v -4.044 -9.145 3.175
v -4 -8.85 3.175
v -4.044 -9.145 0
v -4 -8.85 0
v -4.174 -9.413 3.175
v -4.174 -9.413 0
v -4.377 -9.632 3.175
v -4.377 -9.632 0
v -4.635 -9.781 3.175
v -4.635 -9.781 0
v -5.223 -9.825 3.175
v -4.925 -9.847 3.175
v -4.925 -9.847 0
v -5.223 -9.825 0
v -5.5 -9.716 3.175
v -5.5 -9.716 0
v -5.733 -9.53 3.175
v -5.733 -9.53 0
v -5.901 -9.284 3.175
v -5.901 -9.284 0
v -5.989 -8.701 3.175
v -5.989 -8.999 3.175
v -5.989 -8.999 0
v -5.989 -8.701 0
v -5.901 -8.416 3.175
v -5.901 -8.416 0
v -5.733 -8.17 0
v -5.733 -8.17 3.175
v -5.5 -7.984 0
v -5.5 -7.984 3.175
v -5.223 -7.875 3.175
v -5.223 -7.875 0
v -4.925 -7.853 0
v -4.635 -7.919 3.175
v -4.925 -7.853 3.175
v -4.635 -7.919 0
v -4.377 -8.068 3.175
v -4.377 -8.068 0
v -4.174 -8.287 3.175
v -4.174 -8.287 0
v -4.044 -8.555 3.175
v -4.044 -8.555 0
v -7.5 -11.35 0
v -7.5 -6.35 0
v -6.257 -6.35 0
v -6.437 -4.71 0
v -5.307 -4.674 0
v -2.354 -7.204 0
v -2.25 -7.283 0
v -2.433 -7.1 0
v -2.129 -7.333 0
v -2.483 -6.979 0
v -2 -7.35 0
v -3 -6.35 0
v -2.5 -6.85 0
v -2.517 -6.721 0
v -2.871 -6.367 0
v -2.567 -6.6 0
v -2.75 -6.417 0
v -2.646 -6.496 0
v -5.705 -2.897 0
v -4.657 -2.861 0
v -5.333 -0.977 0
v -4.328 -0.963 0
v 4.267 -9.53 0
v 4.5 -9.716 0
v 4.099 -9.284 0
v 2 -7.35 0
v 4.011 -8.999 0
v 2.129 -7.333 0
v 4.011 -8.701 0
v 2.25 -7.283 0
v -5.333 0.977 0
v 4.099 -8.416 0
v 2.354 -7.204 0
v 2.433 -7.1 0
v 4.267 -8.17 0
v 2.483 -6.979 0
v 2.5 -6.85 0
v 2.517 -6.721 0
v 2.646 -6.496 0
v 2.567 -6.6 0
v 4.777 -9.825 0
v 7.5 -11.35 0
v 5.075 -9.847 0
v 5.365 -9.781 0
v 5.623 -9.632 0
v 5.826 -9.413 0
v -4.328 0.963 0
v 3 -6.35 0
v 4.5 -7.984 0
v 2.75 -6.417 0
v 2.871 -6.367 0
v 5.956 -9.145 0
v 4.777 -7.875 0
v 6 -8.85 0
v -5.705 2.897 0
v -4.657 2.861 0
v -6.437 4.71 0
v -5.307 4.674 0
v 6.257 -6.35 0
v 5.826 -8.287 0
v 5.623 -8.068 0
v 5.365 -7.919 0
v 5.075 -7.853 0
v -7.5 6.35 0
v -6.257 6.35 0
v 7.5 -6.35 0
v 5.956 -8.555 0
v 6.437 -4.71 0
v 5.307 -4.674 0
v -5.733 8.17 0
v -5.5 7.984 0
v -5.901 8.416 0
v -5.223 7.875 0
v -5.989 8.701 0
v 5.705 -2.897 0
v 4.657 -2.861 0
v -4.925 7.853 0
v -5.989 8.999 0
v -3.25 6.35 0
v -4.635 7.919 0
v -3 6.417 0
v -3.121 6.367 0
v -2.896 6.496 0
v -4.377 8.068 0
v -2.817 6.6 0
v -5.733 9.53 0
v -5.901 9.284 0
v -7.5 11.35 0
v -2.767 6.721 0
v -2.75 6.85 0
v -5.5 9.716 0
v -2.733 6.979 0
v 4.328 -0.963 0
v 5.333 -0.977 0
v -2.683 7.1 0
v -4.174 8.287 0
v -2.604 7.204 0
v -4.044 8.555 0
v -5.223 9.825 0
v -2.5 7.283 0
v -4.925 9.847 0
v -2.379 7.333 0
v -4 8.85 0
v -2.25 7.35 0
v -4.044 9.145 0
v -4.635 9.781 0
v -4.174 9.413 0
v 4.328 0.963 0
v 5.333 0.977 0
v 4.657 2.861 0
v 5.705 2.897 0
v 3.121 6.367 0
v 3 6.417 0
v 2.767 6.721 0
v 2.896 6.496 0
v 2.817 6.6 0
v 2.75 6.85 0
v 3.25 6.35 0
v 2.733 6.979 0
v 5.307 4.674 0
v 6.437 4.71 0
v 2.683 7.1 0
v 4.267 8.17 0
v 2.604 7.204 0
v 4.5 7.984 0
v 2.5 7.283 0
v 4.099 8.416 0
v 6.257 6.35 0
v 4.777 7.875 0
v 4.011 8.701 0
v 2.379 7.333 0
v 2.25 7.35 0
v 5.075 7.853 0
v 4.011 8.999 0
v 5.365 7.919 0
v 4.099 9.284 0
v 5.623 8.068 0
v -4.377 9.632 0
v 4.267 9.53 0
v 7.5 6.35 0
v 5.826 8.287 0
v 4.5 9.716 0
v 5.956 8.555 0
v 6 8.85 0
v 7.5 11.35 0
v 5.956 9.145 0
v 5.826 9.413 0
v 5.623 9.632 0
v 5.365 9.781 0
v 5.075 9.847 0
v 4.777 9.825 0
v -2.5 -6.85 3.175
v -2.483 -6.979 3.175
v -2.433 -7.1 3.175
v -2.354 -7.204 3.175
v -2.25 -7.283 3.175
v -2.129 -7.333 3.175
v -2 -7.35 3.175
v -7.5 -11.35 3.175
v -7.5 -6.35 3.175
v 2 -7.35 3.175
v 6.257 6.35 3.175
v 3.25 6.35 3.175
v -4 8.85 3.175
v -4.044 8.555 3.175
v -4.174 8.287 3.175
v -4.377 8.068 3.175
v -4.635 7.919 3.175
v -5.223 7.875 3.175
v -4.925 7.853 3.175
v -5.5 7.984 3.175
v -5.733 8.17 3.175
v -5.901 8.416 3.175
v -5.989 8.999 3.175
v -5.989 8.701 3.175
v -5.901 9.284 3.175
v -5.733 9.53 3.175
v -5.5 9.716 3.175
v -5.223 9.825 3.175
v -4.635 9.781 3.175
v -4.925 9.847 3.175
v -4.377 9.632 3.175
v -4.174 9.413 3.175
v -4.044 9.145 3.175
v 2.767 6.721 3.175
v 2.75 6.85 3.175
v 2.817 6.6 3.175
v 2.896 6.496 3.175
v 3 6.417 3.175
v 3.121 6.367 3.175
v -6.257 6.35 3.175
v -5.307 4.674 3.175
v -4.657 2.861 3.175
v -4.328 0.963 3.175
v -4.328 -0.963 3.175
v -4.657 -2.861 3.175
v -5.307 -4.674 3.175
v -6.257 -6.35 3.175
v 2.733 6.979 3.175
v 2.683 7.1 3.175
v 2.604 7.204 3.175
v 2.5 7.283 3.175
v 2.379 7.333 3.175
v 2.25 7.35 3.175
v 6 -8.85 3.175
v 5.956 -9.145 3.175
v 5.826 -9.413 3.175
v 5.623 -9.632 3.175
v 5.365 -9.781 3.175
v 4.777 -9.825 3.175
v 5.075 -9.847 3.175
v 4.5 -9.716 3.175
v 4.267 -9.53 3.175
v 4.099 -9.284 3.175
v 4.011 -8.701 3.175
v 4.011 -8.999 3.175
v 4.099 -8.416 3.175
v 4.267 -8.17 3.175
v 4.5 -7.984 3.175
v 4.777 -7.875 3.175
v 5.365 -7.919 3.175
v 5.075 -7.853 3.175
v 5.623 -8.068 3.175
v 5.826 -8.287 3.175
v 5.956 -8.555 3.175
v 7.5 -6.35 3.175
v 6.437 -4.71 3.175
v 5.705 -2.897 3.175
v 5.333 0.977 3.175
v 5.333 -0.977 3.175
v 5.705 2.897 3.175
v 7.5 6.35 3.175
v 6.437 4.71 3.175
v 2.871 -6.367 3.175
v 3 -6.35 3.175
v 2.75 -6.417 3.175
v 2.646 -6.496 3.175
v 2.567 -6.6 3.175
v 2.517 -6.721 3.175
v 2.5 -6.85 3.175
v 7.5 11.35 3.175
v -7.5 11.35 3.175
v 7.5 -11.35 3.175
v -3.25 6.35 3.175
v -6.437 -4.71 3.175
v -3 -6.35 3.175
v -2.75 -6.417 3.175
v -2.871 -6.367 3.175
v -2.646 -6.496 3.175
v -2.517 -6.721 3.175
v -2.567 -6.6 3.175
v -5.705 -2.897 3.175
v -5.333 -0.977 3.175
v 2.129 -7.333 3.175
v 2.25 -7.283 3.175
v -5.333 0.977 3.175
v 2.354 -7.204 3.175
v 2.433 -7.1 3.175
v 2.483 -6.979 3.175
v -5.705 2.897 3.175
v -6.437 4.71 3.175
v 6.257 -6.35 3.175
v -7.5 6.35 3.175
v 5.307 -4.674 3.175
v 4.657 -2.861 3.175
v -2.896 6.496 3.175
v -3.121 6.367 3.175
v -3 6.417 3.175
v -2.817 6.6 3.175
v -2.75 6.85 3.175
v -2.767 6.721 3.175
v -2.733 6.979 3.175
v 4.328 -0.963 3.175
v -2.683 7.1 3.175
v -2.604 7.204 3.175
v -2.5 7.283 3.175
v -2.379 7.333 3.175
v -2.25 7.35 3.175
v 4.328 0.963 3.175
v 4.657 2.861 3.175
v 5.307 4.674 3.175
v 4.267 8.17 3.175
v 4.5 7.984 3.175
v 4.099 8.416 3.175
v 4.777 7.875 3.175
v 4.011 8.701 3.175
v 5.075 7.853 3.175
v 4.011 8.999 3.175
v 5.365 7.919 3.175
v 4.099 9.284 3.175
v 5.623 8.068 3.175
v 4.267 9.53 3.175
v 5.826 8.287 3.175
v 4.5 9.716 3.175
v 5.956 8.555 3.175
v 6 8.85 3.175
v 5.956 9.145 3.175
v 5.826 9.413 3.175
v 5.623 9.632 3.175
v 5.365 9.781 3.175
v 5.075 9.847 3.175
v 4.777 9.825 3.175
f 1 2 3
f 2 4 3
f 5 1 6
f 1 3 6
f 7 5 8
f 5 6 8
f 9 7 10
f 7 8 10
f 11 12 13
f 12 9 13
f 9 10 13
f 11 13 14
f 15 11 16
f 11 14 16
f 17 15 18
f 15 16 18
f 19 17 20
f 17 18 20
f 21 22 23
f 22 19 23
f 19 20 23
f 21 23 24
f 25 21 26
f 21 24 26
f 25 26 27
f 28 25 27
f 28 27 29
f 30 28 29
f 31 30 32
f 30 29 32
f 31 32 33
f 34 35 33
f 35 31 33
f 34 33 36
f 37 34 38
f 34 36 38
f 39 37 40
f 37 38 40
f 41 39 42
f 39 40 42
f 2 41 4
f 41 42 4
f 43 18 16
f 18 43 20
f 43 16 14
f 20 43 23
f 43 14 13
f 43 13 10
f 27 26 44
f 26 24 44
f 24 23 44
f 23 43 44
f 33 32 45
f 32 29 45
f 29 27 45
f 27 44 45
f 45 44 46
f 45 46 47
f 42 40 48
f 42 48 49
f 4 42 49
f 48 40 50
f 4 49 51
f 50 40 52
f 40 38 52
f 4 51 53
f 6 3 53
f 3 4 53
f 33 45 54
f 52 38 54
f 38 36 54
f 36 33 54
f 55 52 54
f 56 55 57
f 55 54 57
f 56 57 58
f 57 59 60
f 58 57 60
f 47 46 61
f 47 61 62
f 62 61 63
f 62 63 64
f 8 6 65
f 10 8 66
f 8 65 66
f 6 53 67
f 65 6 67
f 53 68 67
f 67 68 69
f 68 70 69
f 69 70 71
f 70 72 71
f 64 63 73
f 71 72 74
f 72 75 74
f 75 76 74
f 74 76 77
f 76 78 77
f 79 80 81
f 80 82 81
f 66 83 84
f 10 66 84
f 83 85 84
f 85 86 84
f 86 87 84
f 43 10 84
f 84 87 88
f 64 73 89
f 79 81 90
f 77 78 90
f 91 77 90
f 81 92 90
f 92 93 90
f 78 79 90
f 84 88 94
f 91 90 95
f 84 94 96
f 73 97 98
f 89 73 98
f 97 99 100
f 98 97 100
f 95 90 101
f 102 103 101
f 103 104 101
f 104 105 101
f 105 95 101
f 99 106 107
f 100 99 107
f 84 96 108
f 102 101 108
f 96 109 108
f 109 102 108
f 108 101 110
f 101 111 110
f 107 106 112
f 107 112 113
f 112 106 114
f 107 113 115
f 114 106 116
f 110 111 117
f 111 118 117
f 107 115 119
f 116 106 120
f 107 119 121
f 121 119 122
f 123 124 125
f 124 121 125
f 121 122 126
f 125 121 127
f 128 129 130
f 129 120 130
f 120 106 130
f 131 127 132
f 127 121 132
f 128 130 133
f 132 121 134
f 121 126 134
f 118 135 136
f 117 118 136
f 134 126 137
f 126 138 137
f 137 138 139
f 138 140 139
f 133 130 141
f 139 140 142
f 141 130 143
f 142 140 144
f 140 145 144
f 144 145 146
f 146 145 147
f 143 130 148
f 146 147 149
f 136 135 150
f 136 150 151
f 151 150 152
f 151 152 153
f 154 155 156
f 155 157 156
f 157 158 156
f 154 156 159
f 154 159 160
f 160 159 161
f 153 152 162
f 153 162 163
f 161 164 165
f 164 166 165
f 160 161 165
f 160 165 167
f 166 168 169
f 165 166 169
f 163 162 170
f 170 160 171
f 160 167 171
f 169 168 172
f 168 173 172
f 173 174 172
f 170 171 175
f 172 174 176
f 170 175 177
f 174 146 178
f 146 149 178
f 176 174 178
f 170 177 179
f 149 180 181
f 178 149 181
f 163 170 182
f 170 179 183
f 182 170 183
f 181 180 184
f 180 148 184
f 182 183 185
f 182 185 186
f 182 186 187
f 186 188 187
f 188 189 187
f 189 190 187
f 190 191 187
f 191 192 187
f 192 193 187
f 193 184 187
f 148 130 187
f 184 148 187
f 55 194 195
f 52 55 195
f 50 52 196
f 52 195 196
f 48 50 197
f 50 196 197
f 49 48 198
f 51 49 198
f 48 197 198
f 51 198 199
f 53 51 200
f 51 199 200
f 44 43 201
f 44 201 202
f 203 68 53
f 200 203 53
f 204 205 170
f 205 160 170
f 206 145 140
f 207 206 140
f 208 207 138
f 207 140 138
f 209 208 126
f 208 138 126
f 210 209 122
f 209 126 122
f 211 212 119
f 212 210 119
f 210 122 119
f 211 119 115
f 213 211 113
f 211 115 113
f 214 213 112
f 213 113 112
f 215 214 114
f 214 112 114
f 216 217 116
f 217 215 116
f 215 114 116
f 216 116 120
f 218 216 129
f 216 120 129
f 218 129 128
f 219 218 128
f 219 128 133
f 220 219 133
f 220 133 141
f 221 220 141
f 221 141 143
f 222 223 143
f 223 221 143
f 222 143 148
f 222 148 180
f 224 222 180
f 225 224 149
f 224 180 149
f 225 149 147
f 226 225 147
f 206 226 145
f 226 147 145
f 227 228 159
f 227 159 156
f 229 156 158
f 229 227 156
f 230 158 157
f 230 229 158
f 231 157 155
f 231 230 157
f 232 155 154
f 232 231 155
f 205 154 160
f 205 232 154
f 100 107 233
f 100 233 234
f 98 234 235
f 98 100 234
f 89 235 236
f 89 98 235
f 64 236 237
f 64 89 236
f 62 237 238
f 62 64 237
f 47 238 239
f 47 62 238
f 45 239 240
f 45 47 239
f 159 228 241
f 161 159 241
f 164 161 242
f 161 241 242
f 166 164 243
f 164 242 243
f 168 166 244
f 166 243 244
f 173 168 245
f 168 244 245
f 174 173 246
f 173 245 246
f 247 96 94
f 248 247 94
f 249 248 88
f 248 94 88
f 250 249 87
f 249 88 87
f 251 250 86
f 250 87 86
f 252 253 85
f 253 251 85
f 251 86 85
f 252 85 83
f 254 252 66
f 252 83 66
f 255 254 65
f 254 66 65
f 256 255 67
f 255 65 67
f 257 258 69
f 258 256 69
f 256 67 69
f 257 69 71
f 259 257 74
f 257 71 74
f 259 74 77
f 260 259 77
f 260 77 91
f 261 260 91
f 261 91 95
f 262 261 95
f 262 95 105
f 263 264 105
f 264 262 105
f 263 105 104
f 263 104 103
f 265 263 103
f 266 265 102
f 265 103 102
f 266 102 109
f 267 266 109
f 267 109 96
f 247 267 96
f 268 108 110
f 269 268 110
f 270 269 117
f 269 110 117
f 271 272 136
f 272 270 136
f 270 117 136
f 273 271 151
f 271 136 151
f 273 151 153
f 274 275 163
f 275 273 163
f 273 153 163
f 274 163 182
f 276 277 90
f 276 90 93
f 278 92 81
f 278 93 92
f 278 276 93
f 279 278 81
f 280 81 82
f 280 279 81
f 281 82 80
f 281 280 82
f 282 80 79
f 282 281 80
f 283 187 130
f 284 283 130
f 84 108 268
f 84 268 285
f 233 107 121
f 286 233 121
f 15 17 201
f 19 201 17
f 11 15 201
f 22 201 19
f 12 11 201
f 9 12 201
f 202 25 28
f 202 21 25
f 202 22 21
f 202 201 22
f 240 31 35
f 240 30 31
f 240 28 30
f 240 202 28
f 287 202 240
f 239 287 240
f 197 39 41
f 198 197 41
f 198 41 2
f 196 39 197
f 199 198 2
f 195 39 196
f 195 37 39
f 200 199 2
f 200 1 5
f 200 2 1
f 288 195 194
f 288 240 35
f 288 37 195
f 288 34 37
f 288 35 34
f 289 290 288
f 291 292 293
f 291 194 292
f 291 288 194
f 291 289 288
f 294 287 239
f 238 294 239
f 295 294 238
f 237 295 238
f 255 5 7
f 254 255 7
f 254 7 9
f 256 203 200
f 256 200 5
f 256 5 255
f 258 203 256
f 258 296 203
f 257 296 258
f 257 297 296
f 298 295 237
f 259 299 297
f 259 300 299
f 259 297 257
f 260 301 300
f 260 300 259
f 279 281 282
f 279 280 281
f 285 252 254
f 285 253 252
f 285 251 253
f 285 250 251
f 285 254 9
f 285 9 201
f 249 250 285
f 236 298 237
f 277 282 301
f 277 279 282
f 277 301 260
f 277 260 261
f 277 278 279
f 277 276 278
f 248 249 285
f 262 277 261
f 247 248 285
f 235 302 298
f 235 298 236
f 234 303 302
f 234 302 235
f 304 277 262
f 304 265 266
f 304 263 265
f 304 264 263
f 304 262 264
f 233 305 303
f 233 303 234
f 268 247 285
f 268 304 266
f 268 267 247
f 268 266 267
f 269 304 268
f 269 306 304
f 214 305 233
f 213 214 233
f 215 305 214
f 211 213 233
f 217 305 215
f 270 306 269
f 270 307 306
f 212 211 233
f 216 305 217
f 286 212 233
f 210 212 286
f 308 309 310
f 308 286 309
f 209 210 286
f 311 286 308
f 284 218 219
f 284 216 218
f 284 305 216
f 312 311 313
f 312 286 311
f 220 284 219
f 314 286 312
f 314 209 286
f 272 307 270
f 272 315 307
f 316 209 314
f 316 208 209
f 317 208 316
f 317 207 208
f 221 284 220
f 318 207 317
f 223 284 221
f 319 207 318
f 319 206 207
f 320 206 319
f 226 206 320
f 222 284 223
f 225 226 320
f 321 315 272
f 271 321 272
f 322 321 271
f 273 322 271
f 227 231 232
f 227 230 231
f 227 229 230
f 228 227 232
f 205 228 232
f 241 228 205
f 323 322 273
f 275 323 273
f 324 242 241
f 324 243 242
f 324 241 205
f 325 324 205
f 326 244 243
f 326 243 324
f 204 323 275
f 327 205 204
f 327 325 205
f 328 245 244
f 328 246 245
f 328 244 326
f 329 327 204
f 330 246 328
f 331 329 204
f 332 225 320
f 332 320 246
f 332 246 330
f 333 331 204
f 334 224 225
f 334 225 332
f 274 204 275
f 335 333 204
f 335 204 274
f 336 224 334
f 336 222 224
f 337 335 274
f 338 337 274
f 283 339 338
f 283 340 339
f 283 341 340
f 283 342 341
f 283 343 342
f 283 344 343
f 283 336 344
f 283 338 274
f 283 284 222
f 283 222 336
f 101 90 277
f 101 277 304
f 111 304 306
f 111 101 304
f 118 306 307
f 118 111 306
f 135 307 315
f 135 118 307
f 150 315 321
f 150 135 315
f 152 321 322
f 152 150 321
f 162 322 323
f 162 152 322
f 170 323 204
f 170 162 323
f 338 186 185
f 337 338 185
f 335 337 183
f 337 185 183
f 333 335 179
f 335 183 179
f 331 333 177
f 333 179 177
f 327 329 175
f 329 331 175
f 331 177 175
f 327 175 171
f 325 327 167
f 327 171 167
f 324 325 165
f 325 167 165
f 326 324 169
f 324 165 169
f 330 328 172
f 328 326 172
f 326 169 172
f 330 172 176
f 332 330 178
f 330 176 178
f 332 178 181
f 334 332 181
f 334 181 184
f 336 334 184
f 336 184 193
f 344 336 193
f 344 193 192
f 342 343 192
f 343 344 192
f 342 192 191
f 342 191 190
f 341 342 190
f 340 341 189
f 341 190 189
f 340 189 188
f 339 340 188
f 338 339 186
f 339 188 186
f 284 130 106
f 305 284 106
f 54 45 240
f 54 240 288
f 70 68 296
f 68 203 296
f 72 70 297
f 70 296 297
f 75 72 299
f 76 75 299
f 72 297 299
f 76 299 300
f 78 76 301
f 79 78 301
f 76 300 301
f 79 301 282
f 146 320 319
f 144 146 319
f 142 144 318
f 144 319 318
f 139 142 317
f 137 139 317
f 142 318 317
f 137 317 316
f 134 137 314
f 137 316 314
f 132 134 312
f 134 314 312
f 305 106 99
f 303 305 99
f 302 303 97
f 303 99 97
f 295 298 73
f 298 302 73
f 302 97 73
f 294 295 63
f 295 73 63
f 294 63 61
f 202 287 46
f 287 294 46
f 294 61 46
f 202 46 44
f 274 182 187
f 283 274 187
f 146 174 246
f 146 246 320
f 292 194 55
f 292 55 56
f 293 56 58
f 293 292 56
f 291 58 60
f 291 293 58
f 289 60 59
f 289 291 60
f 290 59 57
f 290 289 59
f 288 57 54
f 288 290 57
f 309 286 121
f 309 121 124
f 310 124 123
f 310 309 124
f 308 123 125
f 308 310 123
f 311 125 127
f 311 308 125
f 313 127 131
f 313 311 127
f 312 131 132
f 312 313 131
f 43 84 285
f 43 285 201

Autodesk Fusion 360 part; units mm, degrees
sketch "Sketch1" plane through (0, 0, 0) normal (0, 0, 1) x (1, 0, 0)
  line L0 (-7.5, 6.35) -> (7.5, 6.35)
  line L1 (7.5, 6.35) -> (7.5, 11.35)
  line L2 (7.5, 11.35) -> (-7.5, 11.35)
  line L3 (-7.5, 11.35) -> (-7.5, 6.35)
  line L4 (-7.5, 6.35) -> (7.5, 11.35) construction
  line L5 (7.5, 6.35) -> (-7.5, 11.35) construction
  line L6 (-7.5, -6.35) -> (7.5, -6.35)
  line L7 (7.5, -6.35) -> (7.5, -11.35)
  line L8 (7.5, -11.35) -> (-7.5, -11.35)
  line L9 (-7.5, -11.35) -> (-7.5, -6.35)
  line L10 (-7.5, -6.35) -> (7.5, -11.35) construction
  line L11 (7.5, -6.35) -> (-7.5, -11.35) construction
  arc A0 (-7.5, -6.35) -> (-7.5, 6.35) centre (-15.5, 0) ccw
  arc A1 (-6.2573, -6.35) -> (-6.2573, 6.35) centre (-15.5, 0) ccw
  arc A2 (7.5, 6.35) -> (7.5, -6.35) centre (15.5, 0) ccw
  arc A3 (6.2573, 6.35) -> (6.2573, -6.35) centre (15.5, 0) ccw
  circle A4 centre (-5, -8.85) radius 1
  circle A5 centre (5, -8.85) radius 1
  line L12 (-2.75, 6.35) -> (2.75, 6.35)
  line L13 (2.75, 6.35) -> (2.75, 7.35)
  line L14 (2.75, 7.35) -> (-2.75, 7.35)
  line L15 (-2.75, 7.35) -> (-2.75, 6.35)
  line L16 (-2.75, 6.35) -> (2.75, 7.35) construction
  line L17 (2.75, 6.35) -> (-2.75, 7.35) construction
  line L18 (-2.5, -6.35) -> (2.5, -6.35)
  line L19 (2.5, -6.35) -> (2.5, -7.35)
  line L20 (2.5, -7.35) -> (-2.5, -7.35)
  line L21 (-2.5, -7.35) -> (-2.5, -6.35)
  line L22 (-2.5, -6.35) -> (2.5, -7.35) construction
  line L23 (2.5, -6.35) -> (-2.5, -7.35) construction
  line L24 (0, 0) -> (-9.3045, 0) construction
  circle A6 centre (-5, 8.85) radius 1
  circle A7 centre (5, 8.85) radius 1
  point P0 (0, 8.85)
  point P1 (0, -8.85)
  point P2 (0, 6.85)
  point P3 (0, -6.85)
  dimension "d3" = 15
  dimension "d4" = 5
  dimension "d5" = 6.35
  dimension "d6" = 6.35
  dimension "d8" = 1
  dimension "d13" = 1
  dimension "d14" = 8
  dimension "d15" = 8
  dimension "d16" = 2
  dimension "d17" = 5
  dimension "d18" = 5
  dimension "d19" = 5.5
  dimension "d20" = 1
  dimension "d21" = 1
  dimension "d22" = 5
extrude "Extrude1" add sketch "Sketch1" along normal blind 3.175 contours L0 L1 L2 L3 L13 L14 L15 | L0 L6 A0 A1 | L6 L7 L8 L9 L19 L20 L21 | L0 L6 A2 A3
fillet "Fillet1" radius 0.5 8 edges at (-2.5, -7.35, 1.5875) (-2.5, -6.35, 1.5875) (-2.75, 6.35, 1.5875) (-2.75, 7.35, 1.5875) (2.75, 6.35, 1.5875) (2.75, 7.35, 1.5875) (2.5, -6.35, 1.5875) (2.5, -7.35, 1.5875)
sketch "Sketch3" plane through (0, 0, 3.175) normal (0, 0, 1) x (-1, 0, 0)
  circle A0 centre (-5, -8.85) radius 1
  circle A1 centre (5, -8.85) radius 1
  circle A2 centre (5, 8.85) radius 1
  arc A3 (-3, 6.35) -> (-2.5, 6.85) centre (-3, 6.85) ccw
  arc A4 (-2, 7.35) -> (-2.5, 6.85) centre (-2, 6.85) ccw
  line L0 (-2, 7.35) -> (2, 7.35)
  arc A5 (2.5, 6.85) -> (2, 7.35) centre (2, 6.85) ccw
  arc A6 (2.5, 6.85) -> (3, 6.35) centre (3, 6.85) ccw
  line L1 (3, 6.35) -> (6.2573, 6.35)
  arc A7 (6.2573, 6.35) -> (6.2573, -6.35) centre (15.5, 0) ccw
  line L2 (6.2573, -6.35) -> (3.25, -6.35)
  arc A8 (3.25, -6.35) -> (2.75, -6.85) centre (3.25, -6.85) ccw
  arc A9 (2.25, -7.35) -> (2.75, -6.85) centre (2.25, -6.85) ccw
  line L3 (2.25, -7.35) -> (-2.25, -7.35)
  arc A10 (-2.75, -6.85) -> (-2.25, -7.35) centre (-2.25, -6.85) ccw
  arc A11 (-2.75, -6.85) -> (-3.25, -6.35) centre (-3.25, -6.85) ccw
  line L4 (-3.25, -6.35) -> (-6.2573, -6.35)
  arc A12 (-6.2573, -6.35) -> (-6.2573, 6.35) centre (-15.5, 0) ccw
  line L5 (-6.2573, 6.35) -> (-3, 6.35)
  circle A13 centre (-5, 8.85) radius 1
  line L6 (-7.5, -11.35) -> (7.5, -11.35)
  line L7 (7.5, -11.35) -> (7.5, -6.35)
  arc A14 (7.5, 6.35) -> (7.5, -6.35) centre (15.5, 0) ccw
  line L8 (7.5, 6.35) -> (7.5, 11.35)
  line L9 (7.5, 11.35) -> (-7.5, 11.35)
  line L10 (-7.5, 11.35) -> (-7.5, 6.35)
  arc A15 (-7.5, -6.35) -> (-7.5, 6.35) centre (-15.5, 0) ccw
  line L11 (-7.5, -6.35) -> (-7.5, -11.35)
  circle A16 centre (5, 8.85) radius 1
equation "d6 = d5"
equation "d8 = d13"
equation "d11 = 0'- 1/8\""
equation "d15 = d14"
equation "d18 = d17"
equation "d21 = d20"
